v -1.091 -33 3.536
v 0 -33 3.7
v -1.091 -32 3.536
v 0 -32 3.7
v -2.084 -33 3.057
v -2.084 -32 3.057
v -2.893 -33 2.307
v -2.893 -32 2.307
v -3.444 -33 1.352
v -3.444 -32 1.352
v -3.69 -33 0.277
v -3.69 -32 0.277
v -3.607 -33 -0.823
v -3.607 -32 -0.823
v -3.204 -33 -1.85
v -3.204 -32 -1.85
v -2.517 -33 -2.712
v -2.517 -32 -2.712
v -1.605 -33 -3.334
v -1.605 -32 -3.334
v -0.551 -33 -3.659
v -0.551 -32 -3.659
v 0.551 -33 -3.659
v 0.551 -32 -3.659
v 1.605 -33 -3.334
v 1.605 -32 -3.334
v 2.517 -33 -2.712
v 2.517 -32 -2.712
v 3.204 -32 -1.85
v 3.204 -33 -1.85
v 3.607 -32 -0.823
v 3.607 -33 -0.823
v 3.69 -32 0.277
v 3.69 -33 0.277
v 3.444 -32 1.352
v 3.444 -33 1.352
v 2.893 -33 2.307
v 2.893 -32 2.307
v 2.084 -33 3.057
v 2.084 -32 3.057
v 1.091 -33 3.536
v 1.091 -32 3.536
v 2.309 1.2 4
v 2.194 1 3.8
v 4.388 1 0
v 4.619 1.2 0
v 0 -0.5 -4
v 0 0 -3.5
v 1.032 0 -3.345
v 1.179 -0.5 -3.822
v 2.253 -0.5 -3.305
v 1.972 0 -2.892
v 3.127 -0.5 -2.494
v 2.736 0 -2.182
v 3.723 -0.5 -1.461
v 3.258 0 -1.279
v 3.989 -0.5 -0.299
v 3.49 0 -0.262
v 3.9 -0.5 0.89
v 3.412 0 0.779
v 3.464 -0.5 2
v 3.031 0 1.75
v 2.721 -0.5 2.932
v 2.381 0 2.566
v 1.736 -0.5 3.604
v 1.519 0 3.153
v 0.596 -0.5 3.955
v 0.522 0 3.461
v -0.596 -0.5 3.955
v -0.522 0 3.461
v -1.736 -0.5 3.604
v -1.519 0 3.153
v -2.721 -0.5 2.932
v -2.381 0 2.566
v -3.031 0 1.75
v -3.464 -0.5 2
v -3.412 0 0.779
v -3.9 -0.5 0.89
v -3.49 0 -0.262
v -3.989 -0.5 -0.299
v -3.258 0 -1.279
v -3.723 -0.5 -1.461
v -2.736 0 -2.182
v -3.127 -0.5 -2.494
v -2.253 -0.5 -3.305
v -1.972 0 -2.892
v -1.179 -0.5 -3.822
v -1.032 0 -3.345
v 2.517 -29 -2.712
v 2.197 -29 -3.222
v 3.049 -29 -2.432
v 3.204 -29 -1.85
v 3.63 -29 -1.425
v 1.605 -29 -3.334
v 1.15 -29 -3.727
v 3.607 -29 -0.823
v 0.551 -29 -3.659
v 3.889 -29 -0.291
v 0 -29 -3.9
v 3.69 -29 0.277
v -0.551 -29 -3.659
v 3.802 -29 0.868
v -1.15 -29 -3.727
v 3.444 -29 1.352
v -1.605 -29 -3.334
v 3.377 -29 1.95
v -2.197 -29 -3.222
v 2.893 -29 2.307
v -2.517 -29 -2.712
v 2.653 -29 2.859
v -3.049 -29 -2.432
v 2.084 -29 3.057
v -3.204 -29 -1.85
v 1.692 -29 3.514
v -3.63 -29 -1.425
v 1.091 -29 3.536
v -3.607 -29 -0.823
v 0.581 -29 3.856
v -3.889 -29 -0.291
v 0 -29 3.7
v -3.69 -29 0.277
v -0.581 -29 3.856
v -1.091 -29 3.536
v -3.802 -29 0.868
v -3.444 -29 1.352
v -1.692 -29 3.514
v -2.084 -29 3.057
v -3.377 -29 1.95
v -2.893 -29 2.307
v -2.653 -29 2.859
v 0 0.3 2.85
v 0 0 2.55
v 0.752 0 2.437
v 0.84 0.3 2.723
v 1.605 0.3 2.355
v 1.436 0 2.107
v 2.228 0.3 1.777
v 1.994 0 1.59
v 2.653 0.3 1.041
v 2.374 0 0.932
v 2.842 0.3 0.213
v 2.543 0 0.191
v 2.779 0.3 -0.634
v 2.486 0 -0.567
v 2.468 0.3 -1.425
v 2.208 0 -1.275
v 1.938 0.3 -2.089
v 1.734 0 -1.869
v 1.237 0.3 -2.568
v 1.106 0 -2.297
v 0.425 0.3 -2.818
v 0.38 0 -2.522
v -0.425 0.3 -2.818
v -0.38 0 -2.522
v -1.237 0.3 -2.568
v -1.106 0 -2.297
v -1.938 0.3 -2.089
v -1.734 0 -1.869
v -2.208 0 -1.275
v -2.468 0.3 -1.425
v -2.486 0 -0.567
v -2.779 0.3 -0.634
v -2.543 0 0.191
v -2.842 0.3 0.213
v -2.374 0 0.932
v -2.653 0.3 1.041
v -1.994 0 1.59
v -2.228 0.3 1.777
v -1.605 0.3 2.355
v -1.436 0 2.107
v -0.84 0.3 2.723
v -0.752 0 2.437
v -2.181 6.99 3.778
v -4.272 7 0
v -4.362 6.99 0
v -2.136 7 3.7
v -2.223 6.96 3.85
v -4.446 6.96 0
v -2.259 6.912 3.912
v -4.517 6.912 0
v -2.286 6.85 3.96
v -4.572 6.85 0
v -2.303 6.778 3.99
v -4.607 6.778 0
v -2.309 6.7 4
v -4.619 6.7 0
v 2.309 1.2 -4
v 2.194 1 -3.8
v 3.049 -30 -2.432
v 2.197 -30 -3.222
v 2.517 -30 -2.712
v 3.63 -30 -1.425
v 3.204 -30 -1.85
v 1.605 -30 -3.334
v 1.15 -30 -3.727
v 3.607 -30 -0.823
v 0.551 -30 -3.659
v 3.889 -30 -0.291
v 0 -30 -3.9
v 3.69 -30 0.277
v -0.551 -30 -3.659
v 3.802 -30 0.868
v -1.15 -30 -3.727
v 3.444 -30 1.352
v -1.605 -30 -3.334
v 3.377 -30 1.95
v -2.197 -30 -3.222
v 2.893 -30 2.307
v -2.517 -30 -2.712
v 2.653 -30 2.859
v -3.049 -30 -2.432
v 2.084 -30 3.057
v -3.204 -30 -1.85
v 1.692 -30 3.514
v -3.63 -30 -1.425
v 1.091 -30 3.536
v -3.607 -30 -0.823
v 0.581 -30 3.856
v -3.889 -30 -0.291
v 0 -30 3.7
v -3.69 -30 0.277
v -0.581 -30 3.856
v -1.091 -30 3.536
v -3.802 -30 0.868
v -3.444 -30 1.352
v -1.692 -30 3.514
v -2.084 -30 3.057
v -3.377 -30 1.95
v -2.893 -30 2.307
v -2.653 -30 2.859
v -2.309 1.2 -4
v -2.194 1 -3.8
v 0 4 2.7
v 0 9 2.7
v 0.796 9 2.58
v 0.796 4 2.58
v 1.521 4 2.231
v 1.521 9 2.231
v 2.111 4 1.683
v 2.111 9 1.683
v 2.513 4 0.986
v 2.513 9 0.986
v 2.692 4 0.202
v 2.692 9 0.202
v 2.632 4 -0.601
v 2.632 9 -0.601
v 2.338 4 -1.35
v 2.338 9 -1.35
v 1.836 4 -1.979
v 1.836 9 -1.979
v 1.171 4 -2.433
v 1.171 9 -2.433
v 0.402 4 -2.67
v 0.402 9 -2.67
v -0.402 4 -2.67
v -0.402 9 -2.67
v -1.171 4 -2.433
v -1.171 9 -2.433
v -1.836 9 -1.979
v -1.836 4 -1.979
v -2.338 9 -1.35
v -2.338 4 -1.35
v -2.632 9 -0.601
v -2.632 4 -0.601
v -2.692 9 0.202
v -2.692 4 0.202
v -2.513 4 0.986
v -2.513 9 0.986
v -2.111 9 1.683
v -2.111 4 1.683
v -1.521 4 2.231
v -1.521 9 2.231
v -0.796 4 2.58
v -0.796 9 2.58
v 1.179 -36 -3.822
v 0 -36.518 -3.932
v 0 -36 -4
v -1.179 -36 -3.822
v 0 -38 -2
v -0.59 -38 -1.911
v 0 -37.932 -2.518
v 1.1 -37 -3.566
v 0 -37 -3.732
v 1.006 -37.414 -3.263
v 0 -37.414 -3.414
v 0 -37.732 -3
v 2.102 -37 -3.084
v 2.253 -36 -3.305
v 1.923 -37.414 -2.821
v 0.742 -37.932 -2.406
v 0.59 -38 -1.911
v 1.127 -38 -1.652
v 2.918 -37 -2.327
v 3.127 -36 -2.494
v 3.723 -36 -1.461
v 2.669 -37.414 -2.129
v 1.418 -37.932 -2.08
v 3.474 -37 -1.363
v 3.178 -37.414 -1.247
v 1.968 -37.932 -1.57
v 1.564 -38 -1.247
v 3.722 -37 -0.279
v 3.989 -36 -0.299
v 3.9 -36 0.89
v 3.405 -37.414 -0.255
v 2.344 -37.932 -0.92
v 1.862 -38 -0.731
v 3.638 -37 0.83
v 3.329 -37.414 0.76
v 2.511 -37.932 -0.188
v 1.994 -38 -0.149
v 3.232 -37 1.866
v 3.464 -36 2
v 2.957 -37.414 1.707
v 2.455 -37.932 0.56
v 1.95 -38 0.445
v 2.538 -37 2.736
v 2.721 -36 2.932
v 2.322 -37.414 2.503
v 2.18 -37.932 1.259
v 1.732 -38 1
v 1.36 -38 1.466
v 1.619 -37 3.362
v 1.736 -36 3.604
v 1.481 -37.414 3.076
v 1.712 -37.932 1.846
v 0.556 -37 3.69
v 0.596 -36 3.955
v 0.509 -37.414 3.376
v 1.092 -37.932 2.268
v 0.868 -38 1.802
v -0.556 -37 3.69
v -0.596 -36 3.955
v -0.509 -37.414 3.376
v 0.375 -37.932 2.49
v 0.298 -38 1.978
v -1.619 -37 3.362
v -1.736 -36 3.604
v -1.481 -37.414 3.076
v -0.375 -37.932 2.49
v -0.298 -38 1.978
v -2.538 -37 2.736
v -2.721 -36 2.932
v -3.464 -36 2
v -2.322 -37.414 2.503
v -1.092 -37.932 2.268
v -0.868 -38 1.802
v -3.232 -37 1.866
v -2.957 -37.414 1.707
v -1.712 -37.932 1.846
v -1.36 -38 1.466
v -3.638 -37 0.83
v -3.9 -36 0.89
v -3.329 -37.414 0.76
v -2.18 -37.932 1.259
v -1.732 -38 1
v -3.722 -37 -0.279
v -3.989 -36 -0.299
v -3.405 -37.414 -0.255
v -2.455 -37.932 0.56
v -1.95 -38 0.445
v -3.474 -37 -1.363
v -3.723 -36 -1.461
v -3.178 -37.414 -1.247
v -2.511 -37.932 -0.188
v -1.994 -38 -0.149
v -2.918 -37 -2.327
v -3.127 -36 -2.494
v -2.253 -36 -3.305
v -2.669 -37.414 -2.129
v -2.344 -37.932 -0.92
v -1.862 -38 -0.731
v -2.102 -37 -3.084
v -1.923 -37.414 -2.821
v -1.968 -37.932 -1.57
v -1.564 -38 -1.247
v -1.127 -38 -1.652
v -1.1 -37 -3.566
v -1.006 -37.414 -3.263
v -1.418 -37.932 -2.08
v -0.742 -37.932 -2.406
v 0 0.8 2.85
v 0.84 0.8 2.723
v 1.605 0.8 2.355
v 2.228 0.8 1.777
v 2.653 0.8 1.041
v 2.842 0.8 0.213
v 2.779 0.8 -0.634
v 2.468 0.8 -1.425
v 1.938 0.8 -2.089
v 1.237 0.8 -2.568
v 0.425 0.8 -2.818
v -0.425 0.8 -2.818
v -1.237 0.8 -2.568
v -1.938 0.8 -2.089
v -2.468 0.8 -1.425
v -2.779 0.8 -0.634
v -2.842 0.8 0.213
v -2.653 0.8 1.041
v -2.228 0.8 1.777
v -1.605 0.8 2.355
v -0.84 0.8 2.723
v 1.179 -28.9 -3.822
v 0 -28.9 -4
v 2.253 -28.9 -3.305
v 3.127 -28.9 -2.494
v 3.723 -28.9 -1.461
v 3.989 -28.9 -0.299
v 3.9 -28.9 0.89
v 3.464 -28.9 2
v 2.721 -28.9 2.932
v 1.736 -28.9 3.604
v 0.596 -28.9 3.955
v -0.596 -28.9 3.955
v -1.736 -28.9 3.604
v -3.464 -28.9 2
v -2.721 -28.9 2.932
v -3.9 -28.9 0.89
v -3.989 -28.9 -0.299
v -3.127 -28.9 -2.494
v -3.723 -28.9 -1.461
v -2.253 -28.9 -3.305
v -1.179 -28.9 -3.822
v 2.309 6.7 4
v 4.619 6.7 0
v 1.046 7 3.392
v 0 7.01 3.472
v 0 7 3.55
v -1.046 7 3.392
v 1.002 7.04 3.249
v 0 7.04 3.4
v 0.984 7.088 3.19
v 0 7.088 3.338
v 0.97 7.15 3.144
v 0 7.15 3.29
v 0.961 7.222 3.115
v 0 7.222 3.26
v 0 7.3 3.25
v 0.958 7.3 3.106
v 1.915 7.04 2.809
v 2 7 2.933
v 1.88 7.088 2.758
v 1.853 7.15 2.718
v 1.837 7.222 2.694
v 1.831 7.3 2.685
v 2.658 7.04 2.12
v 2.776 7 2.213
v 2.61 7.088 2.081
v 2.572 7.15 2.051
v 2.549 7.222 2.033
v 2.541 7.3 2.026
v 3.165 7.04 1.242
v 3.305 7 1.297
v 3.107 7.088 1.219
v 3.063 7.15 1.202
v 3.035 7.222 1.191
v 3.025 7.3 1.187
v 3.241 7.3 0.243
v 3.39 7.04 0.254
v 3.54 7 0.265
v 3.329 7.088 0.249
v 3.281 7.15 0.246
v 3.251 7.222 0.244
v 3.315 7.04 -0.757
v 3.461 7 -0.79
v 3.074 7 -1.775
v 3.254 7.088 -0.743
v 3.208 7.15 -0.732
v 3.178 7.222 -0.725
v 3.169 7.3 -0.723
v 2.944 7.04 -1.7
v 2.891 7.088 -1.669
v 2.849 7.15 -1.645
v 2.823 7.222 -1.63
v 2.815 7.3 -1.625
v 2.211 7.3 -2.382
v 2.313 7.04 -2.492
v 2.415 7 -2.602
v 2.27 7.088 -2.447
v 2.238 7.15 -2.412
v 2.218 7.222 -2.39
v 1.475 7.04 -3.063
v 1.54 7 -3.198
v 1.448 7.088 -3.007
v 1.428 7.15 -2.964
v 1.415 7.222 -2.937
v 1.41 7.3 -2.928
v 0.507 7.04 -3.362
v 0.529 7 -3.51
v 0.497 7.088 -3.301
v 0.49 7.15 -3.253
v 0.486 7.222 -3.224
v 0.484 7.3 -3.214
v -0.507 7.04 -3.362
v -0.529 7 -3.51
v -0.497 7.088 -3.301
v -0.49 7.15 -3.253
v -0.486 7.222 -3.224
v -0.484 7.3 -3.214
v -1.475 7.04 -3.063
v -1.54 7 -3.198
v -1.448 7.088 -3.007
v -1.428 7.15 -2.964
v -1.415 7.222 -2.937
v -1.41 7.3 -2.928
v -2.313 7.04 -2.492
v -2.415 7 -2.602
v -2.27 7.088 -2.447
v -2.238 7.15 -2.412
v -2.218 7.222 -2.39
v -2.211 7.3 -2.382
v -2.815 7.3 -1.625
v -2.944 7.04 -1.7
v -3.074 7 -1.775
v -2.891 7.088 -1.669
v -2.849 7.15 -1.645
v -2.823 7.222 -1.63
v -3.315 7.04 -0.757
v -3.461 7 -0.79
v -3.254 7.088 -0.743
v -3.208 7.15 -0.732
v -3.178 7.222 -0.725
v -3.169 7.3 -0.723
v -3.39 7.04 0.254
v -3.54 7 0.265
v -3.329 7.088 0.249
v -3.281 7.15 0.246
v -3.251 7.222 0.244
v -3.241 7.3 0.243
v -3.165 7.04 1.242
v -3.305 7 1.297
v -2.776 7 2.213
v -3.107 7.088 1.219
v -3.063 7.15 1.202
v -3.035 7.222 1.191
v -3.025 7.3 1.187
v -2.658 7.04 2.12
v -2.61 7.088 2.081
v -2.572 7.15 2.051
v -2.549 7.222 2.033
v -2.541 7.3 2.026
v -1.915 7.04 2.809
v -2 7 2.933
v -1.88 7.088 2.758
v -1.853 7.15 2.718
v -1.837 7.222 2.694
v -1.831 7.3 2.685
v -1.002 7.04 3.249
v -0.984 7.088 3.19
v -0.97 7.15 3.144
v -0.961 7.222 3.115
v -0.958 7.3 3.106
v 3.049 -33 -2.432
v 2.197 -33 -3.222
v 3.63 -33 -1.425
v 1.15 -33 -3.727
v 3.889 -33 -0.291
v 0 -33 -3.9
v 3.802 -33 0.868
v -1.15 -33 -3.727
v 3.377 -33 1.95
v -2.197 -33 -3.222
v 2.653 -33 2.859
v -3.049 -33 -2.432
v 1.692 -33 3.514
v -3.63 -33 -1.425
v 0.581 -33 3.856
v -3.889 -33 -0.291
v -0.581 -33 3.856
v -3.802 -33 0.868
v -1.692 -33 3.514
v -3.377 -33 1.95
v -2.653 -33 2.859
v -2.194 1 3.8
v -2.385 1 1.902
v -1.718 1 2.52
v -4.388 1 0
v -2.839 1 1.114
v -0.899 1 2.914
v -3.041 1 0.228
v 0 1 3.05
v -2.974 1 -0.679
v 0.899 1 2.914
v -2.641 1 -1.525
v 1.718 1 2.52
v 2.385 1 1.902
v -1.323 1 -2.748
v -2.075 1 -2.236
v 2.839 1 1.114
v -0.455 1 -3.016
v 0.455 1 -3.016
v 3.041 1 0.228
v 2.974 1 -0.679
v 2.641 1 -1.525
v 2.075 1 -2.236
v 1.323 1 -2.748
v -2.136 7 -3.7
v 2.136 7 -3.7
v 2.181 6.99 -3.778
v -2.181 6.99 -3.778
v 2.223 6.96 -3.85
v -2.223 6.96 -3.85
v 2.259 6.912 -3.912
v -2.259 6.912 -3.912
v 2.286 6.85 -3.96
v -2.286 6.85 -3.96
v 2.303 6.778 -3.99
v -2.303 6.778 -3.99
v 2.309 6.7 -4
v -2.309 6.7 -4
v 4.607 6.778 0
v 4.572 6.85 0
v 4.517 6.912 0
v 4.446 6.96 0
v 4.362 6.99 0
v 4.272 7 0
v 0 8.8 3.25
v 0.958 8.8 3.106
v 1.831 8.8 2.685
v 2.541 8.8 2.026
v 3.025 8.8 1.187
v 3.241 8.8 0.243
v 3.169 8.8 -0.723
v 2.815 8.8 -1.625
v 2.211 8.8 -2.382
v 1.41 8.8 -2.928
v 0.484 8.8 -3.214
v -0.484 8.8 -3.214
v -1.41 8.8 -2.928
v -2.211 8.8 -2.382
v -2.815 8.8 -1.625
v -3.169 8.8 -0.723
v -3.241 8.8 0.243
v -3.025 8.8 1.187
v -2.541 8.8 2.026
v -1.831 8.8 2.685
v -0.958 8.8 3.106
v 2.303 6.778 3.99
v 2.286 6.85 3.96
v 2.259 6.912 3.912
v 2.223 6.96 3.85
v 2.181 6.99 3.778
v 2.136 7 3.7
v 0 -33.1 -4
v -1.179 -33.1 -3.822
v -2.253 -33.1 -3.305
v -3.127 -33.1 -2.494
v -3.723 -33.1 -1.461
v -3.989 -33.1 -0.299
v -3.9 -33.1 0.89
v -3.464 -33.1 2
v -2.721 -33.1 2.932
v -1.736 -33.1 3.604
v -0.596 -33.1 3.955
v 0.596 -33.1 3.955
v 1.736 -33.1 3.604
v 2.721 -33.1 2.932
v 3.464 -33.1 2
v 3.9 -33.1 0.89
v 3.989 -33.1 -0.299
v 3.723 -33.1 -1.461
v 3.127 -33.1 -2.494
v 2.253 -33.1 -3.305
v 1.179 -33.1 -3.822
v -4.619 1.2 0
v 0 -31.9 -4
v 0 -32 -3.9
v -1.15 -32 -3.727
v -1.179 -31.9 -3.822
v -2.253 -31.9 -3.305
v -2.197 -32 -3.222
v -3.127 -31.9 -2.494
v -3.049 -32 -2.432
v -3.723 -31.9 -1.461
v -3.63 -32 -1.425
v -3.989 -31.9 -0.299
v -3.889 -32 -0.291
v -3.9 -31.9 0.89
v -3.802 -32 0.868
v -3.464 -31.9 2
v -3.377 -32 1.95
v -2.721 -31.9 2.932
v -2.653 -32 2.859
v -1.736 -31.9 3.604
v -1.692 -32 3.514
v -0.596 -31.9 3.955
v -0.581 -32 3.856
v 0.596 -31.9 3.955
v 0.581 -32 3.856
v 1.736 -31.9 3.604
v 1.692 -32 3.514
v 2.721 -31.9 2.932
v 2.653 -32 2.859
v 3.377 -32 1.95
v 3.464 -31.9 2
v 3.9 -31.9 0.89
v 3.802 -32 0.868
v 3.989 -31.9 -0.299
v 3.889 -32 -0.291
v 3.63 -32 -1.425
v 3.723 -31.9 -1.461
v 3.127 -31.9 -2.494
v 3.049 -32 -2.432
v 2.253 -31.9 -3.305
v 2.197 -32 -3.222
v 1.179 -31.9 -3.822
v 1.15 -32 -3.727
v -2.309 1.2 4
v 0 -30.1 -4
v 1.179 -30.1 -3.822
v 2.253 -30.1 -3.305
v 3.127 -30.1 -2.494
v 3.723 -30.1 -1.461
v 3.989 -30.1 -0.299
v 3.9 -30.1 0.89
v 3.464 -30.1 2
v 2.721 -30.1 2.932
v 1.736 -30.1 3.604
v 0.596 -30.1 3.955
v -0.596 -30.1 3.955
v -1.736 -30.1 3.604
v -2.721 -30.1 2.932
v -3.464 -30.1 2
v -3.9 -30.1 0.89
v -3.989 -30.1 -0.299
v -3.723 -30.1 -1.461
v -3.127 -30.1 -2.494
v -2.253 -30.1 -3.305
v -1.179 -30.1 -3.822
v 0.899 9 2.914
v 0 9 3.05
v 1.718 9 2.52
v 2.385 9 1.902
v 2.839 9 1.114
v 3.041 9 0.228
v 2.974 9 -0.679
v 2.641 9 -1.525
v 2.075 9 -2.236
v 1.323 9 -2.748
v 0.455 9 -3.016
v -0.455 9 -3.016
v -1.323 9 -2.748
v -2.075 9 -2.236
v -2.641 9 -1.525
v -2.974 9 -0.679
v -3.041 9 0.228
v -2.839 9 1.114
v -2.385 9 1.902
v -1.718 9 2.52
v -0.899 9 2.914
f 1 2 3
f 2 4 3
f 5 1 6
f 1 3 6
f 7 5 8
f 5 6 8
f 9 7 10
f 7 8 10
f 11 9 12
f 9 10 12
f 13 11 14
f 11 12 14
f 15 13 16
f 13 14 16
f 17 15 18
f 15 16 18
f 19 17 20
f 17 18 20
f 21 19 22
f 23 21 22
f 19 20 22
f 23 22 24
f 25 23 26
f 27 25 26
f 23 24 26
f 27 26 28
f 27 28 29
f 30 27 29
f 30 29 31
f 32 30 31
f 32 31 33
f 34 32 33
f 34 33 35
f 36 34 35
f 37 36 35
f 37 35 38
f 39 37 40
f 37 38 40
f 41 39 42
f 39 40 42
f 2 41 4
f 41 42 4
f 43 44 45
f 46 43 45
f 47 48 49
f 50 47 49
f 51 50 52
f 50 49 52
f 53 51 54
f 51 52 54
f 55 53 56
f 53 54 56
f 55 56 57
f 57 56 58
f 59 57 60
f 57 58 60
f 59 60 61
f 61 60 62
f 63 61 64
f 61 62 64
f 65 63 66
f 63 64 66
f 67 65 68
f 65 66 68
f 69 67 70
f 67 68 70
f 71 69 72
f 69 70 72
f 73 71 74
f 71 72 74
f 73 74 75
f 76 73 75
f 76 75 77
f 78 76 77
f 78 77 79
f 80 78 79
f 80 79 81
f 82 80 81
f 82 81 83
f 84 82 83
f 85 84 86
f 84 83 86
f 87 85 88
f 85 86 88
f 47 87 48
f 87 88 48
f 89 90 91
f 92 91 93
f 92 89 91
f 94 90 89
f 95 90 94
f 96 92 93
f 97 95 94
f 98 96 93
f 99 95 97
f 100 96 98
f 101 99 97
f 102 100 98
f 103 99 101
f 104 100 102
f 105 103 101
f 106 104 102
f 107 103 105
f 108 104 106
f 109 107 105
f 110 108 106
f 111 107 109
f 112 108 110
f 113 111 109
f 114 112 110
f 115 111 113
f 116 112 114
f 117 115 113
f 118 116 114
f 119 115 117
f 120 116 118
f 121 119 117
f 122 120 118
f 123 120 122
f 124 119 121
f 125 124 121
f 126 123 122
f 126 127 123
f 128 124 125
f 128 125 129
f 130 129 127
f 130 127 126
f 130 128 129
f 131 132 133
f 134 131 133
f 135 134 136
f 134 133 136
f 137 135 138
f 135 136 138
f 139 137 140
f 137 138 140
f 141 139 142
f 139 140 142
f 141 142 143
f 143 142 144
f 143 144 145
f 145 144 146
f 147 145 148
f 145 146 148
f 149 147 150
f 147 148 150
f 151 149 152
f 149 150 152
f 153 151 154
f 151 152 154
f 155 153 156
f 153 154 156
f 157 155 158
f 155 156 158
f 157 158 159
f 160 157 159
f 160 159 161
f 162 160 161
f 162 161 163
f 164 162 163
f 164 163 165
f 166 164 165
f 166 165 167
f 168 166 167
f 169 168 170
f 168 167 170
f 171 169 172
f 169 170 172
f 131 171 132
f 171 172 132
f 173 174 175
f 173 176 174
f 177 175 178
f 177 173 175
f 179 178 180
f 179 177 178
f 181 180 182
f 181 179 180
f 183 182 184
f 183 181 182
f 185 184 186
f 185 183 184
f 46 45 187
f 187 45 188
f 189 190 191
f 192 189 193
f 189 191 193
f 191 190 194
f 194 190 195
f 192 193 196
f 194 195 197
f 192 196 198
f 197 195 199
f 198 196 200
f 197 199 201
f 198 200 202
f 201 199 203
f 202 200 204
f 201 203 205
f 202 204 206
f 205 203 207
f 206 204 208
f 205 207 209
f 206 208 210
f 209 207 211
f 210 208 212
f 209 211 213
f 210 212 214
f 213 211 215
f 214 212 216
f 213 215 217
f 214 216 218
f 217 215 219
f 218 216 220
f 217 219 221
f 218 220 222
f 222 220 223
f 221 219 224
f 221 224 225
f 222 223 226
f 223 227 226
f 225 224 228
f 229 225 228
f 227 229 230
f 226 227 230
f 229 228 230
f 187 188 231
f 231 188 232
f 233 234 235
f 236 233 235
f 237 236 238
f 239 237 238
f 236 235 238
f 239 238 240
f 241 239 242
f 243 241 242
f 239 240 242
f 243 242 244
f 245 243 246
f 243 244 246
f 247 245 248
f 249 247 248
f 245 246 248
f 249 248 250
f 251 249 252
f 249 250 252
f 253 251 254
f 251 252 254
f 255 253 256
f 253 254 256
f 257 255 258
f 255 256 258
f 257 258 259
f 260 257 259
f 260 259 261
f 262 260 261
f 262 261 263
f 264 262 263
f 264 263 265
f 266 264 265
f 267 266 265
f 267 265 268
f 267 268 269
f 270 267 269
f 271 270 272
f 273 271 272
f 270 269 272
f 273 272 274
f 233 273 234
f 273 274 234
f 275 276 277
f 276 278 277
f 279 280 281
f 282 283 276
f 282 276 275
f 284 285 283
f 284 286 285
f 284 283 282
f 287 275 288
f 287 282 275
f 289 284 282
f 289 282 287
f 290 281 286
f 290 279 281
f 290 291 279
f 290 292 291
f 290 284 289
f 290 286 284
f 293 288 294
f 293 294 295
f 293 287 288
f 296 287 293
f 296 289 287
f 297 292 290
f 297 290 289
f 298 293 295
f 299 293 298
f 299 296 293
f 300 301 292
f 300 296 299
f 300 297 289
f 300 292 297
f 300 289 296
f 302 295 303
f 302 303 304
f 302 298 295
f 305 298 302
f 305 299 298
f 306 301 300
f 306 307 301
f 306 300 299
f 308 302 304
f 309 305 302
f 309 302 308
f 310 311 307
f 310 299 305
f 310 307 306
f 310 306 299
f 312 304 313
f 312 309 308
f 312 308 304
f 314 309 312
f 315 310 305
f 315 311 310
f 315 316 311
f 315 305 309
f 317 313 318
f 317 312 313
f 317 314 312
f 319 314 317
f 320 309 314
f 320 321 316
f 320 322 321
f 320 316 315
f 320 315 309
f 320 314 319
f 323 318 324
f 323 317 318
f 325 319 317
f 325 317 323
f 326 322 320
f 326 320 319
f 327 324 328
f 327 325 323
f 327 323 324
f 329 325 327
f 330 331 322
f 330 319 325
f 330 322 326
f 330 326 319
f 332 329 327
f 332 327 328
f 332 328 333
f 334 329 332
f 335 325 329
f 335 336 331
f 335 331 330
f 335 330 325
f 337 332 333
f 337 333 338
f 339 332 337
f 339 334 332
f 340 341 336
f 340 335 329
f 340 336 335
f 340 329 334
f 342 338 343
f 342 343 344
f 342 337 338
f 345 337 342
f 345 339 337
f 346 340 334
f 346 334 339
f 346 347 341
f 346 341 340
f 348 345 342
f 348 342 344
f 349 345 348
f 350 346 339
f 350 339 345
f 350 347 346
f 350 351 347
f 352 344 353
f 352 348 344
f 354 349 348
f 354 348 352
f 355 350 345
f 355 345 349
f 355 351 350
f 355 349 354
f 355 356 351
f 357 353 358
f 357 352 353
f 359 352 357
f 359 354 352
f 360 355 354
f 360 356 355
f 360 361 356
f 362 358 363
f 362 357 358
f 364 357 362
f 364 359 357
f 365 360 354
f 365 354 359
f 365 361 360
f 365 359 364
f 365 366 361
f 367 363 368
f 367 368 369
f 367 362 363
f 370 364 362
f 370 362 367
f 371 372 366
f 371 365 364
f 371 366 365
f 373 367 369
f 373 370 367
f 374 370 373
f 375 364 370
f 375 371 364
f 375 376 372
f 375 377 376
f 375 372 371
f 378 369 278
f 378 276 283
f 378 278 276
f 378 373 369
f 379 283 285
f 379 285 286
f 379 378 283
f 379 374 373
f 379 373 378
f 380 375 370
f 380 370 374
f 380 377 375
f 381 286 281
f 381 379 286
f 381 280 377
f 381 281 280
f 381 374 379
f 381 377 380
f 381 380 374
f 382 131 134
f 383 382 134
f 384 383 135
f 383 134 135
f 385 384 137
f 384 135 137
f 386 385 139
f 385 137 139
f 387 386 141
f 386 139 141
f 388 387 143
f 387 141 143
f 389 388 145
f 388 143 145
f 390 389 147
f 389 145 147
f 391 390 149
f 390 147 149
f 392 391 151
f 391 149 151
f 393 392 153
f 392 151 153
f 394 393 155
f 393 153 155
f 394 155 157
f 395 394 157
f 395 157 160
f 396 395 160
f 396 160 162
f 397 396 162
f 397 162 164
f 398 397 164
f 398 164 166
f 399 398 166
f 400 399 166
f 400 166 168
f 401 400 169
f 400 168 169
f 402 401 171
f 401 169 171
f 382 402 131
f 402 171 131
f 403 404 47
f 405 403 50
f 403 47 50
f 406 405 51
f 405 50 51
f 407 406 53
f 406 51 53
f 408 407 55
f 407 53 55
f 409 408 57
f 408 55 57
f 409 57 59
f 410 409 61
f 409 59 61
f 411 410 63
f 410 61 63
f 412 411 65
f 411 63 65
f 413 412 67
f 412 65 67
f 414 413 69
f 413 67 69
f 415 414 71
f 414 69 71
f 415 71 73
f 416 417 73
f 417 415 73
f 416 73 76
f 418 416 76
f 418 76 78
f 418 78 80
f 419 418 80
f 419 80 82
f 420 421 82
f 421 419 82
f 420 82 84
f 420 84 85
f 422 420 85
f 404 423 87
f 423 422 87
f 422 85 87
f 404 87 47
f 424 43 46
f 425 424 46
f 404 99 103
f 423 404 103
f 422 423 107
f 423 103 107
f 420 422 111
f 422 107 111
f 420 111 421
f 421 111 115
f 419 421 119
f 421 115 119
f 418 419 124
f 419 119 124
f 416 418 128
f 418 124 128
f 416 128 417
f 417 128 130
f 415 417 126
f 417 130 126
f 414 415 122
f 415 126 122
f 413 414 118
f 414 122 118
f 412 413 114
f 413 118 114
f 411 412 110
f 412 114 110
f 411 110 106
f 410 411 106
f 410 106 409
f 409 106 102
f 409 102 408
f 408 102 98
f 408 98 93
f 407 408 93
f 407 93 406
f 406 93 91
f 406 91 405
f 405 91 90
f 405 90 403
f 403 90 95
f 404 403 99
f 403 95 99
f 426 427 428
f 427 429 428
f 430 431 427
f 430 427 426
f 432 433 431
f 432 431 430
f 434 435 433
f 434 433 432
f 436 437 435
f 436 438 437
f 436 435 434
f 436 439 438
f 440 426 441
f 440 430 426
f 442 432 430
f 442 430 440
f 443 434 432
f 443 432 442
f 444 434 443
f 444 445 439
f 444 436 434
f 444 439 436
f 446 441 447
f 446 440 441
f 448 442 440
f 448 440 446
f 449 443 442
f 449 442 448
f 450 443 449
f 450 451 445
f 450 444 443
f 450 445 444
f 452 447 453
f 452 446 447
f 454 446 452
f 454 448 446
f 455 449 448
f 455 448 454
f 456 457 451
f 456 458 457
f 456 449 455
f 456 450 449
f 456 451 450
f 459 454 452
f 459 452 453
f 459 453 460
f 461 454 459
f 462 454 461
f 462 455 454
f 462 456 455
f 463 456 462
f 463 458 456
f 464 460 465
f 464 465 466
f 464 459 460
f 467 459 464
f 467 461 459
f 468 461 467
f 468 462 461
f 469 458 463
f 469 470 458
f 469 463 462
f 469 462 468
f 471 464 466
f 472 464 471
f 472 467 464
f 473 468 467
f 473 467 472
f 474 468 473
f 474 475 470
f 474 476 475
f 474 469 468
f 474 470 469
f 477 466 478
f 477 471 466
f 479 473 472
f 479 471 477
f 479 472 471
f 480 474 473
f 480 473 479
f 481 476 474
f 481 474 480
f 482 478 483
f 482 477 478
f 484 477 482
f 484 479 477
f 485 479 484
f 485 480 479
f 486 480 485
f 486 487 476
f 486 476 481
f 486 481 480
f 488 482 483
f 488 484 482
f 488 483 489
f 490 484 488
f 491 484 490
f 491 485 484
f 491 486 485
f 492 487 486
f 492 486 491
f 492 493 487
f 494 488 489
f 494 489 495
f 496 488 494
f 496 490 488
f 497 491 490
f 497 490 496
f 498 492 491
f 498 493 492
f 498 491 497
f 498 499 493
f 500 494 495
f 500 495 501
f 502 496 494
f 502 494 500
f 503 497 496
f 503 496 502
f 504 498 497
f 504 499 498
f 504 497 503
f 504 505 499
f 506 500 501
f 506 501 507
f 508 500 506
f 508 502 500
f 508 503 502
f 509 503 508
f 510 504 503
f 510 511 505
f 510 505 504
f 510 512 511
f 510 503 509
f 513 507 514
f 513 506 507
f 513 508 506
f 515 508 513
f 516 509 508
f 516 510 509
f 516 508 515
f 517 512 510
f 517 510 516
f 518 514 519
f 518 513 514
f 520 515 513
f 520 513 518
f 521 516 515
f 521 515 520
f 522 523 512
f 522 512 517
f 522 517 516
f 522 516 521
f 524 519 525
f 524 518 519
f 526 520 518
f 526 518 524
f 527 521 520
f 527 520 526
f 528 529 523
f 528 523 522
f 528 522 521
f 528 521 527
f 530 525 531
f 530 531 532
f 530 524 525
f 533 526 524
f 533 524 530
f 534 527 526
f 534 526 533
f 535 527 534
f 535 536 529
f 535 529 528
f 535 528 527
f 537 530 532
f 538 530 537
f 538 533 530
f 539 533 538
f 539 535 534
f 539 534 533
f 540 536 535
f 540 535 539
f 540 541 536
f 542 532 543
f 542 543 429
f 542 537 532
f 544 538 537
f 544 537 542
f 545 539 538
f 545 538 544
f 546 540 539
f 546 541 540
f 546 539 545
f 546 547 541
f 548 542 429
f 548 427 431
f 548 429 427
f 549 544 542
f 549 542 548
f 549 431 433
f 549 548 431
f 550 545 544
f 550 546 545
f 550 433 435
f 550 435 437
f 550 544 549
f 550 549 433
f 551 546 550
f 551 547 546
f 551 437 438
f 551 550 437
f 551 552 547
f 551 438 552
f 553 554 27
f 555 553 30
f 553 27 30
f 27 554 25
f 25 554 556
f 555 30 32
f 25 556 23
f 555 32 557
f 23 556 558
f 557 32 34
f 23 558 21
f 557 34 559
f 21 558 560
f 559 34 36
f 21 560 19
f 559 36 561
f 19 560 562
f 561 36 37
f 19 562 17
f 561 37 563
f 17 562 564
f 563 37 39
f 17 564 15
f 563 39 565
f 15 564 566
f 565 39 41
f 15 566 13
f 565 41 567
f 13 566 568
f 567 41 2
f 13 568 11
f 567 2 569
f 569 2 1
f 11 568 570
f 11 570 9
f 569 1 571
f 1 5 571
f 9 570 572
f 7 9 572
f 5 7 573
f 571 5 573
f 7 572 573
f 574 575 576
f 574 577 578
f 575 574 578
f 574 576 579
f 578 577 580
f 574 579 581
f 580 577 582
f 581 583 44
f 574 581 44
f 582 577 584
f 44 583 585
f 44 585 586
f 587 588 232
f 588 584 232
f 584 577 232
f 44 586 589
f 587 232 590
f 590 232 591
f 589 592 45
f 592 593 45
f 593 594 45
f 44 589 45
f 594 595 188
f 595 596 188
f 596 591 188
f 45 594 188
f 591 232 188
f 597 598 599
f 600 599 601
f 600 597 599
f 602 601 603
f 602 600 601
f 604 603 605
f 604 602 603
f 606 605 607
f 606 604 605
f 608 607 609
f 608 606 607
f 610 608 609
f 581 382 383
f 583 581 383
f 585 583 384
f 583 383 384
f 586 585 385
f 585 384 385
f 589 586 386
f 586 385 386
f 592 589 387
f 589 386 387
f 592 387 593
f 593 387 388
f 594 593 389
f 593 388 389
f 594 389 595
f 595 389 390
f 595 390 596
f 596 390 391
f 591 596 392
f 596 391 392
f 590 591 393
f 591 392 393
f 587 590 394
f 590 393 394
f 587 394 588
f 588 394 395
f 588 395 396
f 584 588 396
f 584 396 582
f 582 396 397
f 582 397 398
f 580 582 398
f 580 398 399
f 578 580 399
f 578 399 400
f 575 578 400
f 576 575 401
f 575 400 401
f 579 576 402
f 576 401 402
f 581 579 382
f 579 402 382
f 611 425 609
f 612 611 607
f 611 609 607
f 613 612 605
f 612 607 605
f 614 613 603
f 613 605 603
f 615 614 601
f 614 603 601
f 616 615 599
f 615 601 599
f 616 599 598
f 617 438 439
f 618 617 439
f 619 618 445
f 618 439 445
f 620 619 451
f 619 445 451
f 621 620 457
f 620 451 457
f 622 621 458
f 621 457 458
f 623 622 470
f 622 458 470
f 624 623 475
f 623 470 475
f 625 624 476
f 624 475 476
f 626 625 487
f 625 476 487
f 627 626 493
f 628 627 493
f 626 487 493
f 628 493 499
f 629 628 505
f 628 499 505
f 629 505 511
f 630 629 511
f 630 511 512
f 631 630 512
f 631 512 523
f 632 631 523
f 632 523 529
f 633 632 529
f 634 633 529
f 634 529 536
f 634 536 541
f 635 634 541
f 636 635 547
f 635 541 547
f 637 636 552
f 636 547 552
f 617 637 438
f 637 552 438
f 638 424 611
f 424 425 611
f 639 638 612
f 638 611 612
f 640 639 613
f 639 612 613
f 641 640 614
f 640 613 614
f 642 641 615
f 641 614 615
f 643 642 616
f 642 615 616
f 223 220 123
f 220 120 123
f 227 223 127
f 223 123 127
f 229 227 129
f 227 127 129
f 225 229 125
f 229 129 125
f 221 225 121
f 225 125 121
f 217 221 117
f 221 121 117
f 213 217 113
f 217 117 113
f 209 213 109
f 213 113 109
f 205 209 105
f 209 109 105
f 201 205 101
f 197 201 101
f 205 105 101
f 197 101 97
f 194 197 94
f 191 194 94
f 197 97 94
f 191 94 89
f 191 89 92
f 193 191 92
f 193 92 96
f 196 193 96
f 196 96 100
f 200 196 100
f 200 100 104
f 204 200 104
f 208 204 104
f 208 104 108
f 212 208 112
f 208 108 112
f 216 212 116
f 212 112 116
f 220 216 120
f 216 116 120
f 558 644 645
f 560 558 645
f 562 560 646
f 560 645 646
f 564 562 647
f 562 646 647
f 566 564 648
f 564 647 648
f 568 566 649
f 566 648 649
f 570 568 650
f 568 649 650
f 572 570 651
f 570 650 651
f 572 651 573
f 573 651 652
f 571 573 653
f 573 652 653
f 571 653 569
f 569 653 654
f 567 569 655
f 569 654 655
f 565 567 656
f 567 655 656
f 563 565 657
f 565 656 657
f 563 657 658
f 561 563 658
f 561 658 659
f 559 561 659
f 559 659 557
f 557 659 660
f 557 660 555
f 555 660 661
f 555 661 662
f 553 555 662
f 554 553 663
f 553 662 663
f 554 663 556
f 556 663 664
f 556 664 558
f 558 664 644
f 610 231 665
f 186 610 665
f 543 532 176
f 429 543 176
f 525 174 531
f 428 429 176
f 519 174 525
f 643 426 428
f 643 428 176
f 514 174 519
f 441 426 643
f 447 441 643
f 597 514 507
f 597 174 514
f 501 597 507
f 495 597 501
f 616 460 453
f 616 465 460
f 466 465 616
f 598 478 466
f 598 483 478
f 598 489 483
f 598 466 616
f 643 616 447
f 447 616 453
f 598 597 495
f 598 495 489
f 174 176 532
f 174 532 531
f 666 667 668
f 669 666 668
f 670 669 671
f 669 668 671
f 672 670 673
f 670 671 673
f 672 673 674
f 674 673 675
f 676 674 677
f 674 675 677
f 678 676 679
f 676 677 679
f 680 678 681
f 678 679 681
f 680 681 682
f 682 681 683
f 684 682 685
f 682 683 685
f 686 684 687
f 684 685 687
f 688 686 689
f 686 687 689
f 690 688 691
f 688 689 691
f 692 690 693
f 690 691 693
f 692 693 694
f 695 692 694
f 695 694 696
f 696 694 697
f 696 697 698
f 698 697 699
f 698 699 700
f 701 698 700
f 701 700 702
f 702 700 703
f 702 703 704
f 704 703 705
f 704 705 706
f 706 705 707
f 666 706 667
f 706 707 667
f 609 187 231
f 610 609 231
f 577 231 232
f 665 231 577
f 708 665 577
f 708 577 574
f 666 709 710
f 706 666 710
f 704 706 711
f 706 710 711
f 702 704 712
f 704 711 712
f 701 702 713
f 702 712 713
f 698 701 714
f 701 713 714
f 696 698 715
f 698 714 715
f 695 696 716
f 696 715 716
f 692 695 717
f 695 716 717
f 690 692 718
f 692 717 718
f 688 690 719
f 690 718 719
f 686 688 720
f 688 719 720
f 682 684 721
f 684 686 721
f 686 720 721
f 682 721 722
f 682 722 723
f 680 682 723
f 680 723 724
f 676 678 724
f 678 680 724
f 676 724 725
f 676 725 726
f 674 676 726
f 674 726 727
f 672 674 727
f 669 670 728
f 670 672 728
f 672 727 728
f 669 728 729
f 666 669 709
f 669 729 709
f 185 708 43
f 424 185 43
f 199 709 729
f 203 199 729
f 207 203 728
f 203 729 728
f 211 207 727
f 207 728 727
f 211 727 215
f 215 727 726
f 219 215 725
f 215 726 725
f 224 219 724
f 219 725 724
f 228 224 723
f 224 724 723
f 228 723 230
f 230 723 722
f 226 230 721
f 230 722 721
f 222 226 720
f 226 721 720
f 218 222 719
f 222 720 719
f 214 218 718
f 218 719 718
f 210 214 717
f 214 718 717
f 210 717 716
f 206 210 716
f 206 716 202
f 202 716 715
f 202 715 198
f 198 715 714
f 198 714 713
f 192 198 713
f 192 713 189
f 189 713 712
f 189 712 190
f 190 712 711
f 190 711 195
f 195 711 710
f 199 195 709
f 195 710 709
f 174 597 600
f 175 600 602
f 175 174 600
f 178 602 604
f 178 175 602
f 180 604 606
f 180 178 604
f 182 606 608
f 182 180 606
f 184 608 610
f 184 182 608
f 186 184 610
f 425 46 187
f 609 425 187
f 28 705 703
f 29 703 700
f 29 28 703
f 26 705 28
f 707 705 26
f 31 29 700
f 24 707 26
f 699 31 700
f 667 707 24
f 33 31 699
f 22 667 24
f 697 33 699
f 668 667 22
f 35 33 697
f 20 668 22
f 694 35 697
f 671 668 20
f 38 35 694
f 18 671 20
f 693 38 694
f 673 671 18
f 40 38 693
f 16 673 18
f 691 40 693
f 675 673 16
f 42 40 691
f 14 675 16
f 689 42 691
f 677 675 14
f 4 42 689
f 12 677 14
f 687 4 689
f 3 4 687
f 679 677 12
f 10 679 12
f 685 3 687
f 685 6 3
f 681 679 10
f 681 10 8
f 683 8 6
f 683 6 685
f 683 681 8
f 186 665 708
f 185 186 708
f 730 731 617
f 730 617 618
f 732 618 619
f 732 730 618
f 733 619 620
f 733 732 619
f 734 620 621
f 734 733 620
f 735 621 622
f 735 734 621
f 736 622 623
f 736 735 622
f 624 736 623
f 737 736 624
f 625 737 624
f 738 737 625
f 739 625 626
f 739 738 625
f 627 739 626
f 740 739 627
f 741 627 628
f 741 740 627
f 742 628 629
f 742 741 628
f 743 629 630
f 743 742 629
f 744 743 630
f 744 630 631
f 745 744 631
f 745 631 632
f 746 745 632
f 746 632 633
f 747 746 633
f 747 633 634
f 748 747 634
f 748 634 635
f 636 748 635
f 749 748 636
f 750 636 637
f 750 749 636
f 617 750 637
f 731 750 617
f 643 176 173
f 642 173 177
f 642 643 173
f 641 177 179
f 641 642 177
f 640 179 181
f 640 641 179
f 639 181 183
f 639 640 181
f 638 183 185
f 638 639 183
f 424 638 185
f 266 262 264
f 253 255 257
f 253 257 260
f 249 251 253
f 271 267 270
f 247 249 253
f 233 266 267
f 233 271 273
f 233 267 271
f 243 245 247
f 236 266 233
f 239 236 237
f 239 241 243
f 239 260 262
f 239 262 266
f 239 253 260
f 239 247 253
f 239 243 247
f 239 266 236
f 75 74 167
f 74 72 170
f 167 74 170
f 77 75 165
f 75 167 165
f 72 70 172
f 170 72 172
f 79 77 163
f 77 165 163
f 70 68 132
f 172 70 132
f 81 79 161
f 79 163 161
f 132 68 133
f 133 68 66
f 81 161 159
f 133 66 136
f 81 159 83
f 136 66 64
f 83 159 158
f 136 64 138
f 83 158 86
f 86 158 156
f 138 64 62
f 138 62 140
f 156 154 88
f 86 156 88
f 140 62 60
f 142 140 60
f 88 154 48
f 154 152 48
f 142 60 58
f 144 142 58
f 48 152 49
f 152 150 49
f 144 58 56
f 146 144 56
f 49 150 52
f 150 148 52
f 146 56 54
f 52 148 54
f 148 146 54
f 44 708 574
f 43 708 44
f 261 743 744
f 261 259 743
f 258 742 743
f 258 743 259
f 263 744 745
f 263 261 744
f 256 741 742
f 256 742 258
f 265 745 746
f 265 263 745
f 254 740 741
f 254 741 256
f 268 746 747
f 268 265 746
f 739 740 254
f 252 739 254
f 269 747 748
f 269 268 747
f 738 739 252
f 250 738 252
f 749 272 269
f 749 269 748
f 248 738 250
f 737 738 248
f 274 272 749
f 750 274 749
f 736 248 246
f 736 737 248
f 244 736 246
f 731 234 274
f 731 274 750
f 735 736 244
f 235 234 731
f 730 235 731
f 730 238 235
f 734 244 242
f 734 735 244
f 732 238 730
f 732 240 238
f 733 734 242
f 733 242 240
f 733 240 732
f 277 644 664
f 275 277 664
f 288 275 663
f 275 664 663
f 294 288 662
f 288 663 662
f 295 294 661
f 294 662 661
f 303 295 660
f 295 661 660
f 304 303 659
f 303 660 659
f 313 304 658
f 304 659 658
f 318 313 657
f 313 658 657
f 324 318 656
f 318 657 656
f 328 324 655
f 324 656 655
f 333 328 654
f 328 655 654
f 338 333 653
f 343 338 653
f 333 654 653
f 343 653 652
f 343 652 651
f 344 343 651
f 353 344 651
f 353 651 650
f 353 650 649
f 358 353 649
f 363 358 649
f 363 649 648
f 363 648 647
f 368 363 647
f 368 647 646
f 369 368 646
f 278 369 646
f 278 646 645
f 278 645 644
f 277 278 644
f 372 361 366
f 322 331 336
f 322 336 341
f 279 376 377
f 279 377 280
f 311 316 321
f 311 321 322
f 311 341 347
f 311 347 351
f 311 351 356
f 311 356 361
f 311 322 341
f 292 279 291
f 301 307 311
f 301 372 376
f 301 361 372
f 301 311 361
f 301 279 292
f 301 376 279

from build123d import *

# Parameters (mm, degrees)
SKETCH_1_R          = 2.85
EXTRUDE_1_DEPTH     = 1
EXTRUDE_2_DEPTH     = 6
SKETCH_3_R          = 3.25
EXTRUDE_3_DEPTH     = 2
CHAMFER_3_SIZE      = 0.2
FILLET_2_R          = 0.3
CHAMFER_4_SIZE      = 0.2
CHAMFER_5_SIZE      = 0.3
SKETCH_5_R          = 2.7
CUT_EXTRUDE_1_DEPTH = 5
SKETCH_6_R          = 4
EXTRUDE_4_DEPTH     = 38
FILLET_3_R          = 2
CHAMFER_6_SIZE      = 0.5
SKETCH_7_W          = 4
SKETCH_7_H          = 1
CHAMFER_7_SIZE      = 0.1


with BuildPart() as part:
    # 草图1 → 凸台-拉伸1 (new body)
    with BuildSketch(Plane(origin=(0, 0, 0), x_dir=(1, 0, 0), z_dir=(0, 1, 0))):
        with Locations(Location((0, 0, 0), (0, 0, 270))):
            Circle(SKETCH_1_R)
    extrude(amount=EXTRUDE_1_DEPTH)

    # 草图2 → 凸台-拉伸2 (add)
    with BuildSketch(Plane(origin=(0, 1, 0), x_dir=(1, 0, 0), z_dir=(0, 1, 0))):
        Polygon((4.618802154, 0), (2.309401077, 4), (-2.309401077, 4), (-4.618802154, 0), (-2.309401077, -4), (2.309401077, -4), align=None)
    extrude(amount=EXTRUDE_2_DEPTH)

    # 草图3 → 凸台-拉伸3 (add)
    with BuildSketch(Plane(origin=(0, 7, 0), x_dir=(1, 0, 0), z_dir=(0, 1, 0))):
        with Locations(Location((0, 0, 0), (0, 0, 270))):
            Circle(SKETCH_3_R)
    extrude(amount=EXTRUDE_3_DEPTH)

    # 倒角3
    chamfer_3_edges = [part.edges().sort_by_distance(p)[0] for p in [
        (0, 1, -2.85),
        (3.464101615, 1, 2),
        (3.464101615, 1, -2),
        (0, 1, -4),
        (-3.464101615, 1, -2),
        (-3.464101615, 1, 2),
        (0, 1, 4),
    ]]
    chamfer(chamfer_3_edges, length=CHAMFER_3_SIZE)

    # 圆角2
    fillet_2_edges = [part.edges().sort_by_distance(p)[0] for p in [
        (0, 7, -3.25),
        (3.464101615, 7, 2),
        (3.464101615, 7, -2),
        (0, 7, -4),
        (-3.464101615, 7, -2),
        (-3.464101615, 7, 2),
        (0, 7, 4),
    ]]
    fillet(fillet_2_edges, radius=FILLET_2_R)

    # 倒角4
    chamfer_4_edges = [part.edges().sort_by_distance(p)[0] for p in [
        (0, 9, -3.25),
    ]]
    chamfer(chamfer_4_edges, length=CHAMFER_4_SIZE)

    # 倒角5
    chamfer_5_edges = [part.edges().sort_by_distance(p)[0] for p in [
        (0, 0, -2.85),
    ]]
    chamfer(chamfer_5_edges, length=CHAMFER_5_SIZE)

    # 草图5 → 切除-拉伸1 (cut)
    with BuildSketch(Plane(origin=(0, 9, 0), x_dir=(1, 0, 0), z_dir=(0, 1, 0))):
        with Locations(Location((0, 0, 0), (0, 0, 270))):
            Circle(SKETCH_5_R)
    extrude(amount=-CUT_EXTRUDE_1_DEPTH, mode=Mode.SUBTRACT)

    # 草图6 → 凸台-拉伸4 (add)
    with BuildSketch(Plane.XZ):
        with Locations(Location((0, 0, 0), (0, 0, 270))):
            Circle(SKETCH_6_R)
    extrude(amount=EXTRUDE_4_DEPTH)

    # 圆角3
    fillet_3_edges = [part.edges().sort_by_distance(p)[0] for p in [
        (0, -38, 4),
    ]]
    fillet(fillet_3_edges, radius=FILLET_3_R)

    # 倒角6
    chamfer_6_edges = [part.edges().sort_by_distance(p)[0] for p in [
        (0, 0, 4),
    ]]
    chamfer(chamfer_6_edges, length=CHAMFER_6_SIZE)

    # 草图7 → 切除-旋转1 (revolve, cut)
    with BuildSketch(Plane(origin=(0, 0, 0), x_dir=(0, 0, -1), z_dir=(1, 0, 0))):
        with Locations((-5.7, -32.5)):
            Rectangle(SKETCH_7_W, SKETCH_7_H)
        with Locations((-5.7, -29.5)):
            Rectangle(SKETCH_7_W, SKETCH_7_H)
    revolve(axis=Axis((0, 0, 0), (0, -1, 0)), mode=Mode.SUBTRACT)

    # 倒角7
    chamfer_7_edges = [part.edges().sort_by_distance(p)[0] for p in [
        (0, -33, 4),
        (0, -32, 4),
        (0, -30, 4),
        (0, -29, 4),
    ]]
    chamfer(chamfer_7_edges, length=CHAMFER_7_SIZE)


solid = part.part
